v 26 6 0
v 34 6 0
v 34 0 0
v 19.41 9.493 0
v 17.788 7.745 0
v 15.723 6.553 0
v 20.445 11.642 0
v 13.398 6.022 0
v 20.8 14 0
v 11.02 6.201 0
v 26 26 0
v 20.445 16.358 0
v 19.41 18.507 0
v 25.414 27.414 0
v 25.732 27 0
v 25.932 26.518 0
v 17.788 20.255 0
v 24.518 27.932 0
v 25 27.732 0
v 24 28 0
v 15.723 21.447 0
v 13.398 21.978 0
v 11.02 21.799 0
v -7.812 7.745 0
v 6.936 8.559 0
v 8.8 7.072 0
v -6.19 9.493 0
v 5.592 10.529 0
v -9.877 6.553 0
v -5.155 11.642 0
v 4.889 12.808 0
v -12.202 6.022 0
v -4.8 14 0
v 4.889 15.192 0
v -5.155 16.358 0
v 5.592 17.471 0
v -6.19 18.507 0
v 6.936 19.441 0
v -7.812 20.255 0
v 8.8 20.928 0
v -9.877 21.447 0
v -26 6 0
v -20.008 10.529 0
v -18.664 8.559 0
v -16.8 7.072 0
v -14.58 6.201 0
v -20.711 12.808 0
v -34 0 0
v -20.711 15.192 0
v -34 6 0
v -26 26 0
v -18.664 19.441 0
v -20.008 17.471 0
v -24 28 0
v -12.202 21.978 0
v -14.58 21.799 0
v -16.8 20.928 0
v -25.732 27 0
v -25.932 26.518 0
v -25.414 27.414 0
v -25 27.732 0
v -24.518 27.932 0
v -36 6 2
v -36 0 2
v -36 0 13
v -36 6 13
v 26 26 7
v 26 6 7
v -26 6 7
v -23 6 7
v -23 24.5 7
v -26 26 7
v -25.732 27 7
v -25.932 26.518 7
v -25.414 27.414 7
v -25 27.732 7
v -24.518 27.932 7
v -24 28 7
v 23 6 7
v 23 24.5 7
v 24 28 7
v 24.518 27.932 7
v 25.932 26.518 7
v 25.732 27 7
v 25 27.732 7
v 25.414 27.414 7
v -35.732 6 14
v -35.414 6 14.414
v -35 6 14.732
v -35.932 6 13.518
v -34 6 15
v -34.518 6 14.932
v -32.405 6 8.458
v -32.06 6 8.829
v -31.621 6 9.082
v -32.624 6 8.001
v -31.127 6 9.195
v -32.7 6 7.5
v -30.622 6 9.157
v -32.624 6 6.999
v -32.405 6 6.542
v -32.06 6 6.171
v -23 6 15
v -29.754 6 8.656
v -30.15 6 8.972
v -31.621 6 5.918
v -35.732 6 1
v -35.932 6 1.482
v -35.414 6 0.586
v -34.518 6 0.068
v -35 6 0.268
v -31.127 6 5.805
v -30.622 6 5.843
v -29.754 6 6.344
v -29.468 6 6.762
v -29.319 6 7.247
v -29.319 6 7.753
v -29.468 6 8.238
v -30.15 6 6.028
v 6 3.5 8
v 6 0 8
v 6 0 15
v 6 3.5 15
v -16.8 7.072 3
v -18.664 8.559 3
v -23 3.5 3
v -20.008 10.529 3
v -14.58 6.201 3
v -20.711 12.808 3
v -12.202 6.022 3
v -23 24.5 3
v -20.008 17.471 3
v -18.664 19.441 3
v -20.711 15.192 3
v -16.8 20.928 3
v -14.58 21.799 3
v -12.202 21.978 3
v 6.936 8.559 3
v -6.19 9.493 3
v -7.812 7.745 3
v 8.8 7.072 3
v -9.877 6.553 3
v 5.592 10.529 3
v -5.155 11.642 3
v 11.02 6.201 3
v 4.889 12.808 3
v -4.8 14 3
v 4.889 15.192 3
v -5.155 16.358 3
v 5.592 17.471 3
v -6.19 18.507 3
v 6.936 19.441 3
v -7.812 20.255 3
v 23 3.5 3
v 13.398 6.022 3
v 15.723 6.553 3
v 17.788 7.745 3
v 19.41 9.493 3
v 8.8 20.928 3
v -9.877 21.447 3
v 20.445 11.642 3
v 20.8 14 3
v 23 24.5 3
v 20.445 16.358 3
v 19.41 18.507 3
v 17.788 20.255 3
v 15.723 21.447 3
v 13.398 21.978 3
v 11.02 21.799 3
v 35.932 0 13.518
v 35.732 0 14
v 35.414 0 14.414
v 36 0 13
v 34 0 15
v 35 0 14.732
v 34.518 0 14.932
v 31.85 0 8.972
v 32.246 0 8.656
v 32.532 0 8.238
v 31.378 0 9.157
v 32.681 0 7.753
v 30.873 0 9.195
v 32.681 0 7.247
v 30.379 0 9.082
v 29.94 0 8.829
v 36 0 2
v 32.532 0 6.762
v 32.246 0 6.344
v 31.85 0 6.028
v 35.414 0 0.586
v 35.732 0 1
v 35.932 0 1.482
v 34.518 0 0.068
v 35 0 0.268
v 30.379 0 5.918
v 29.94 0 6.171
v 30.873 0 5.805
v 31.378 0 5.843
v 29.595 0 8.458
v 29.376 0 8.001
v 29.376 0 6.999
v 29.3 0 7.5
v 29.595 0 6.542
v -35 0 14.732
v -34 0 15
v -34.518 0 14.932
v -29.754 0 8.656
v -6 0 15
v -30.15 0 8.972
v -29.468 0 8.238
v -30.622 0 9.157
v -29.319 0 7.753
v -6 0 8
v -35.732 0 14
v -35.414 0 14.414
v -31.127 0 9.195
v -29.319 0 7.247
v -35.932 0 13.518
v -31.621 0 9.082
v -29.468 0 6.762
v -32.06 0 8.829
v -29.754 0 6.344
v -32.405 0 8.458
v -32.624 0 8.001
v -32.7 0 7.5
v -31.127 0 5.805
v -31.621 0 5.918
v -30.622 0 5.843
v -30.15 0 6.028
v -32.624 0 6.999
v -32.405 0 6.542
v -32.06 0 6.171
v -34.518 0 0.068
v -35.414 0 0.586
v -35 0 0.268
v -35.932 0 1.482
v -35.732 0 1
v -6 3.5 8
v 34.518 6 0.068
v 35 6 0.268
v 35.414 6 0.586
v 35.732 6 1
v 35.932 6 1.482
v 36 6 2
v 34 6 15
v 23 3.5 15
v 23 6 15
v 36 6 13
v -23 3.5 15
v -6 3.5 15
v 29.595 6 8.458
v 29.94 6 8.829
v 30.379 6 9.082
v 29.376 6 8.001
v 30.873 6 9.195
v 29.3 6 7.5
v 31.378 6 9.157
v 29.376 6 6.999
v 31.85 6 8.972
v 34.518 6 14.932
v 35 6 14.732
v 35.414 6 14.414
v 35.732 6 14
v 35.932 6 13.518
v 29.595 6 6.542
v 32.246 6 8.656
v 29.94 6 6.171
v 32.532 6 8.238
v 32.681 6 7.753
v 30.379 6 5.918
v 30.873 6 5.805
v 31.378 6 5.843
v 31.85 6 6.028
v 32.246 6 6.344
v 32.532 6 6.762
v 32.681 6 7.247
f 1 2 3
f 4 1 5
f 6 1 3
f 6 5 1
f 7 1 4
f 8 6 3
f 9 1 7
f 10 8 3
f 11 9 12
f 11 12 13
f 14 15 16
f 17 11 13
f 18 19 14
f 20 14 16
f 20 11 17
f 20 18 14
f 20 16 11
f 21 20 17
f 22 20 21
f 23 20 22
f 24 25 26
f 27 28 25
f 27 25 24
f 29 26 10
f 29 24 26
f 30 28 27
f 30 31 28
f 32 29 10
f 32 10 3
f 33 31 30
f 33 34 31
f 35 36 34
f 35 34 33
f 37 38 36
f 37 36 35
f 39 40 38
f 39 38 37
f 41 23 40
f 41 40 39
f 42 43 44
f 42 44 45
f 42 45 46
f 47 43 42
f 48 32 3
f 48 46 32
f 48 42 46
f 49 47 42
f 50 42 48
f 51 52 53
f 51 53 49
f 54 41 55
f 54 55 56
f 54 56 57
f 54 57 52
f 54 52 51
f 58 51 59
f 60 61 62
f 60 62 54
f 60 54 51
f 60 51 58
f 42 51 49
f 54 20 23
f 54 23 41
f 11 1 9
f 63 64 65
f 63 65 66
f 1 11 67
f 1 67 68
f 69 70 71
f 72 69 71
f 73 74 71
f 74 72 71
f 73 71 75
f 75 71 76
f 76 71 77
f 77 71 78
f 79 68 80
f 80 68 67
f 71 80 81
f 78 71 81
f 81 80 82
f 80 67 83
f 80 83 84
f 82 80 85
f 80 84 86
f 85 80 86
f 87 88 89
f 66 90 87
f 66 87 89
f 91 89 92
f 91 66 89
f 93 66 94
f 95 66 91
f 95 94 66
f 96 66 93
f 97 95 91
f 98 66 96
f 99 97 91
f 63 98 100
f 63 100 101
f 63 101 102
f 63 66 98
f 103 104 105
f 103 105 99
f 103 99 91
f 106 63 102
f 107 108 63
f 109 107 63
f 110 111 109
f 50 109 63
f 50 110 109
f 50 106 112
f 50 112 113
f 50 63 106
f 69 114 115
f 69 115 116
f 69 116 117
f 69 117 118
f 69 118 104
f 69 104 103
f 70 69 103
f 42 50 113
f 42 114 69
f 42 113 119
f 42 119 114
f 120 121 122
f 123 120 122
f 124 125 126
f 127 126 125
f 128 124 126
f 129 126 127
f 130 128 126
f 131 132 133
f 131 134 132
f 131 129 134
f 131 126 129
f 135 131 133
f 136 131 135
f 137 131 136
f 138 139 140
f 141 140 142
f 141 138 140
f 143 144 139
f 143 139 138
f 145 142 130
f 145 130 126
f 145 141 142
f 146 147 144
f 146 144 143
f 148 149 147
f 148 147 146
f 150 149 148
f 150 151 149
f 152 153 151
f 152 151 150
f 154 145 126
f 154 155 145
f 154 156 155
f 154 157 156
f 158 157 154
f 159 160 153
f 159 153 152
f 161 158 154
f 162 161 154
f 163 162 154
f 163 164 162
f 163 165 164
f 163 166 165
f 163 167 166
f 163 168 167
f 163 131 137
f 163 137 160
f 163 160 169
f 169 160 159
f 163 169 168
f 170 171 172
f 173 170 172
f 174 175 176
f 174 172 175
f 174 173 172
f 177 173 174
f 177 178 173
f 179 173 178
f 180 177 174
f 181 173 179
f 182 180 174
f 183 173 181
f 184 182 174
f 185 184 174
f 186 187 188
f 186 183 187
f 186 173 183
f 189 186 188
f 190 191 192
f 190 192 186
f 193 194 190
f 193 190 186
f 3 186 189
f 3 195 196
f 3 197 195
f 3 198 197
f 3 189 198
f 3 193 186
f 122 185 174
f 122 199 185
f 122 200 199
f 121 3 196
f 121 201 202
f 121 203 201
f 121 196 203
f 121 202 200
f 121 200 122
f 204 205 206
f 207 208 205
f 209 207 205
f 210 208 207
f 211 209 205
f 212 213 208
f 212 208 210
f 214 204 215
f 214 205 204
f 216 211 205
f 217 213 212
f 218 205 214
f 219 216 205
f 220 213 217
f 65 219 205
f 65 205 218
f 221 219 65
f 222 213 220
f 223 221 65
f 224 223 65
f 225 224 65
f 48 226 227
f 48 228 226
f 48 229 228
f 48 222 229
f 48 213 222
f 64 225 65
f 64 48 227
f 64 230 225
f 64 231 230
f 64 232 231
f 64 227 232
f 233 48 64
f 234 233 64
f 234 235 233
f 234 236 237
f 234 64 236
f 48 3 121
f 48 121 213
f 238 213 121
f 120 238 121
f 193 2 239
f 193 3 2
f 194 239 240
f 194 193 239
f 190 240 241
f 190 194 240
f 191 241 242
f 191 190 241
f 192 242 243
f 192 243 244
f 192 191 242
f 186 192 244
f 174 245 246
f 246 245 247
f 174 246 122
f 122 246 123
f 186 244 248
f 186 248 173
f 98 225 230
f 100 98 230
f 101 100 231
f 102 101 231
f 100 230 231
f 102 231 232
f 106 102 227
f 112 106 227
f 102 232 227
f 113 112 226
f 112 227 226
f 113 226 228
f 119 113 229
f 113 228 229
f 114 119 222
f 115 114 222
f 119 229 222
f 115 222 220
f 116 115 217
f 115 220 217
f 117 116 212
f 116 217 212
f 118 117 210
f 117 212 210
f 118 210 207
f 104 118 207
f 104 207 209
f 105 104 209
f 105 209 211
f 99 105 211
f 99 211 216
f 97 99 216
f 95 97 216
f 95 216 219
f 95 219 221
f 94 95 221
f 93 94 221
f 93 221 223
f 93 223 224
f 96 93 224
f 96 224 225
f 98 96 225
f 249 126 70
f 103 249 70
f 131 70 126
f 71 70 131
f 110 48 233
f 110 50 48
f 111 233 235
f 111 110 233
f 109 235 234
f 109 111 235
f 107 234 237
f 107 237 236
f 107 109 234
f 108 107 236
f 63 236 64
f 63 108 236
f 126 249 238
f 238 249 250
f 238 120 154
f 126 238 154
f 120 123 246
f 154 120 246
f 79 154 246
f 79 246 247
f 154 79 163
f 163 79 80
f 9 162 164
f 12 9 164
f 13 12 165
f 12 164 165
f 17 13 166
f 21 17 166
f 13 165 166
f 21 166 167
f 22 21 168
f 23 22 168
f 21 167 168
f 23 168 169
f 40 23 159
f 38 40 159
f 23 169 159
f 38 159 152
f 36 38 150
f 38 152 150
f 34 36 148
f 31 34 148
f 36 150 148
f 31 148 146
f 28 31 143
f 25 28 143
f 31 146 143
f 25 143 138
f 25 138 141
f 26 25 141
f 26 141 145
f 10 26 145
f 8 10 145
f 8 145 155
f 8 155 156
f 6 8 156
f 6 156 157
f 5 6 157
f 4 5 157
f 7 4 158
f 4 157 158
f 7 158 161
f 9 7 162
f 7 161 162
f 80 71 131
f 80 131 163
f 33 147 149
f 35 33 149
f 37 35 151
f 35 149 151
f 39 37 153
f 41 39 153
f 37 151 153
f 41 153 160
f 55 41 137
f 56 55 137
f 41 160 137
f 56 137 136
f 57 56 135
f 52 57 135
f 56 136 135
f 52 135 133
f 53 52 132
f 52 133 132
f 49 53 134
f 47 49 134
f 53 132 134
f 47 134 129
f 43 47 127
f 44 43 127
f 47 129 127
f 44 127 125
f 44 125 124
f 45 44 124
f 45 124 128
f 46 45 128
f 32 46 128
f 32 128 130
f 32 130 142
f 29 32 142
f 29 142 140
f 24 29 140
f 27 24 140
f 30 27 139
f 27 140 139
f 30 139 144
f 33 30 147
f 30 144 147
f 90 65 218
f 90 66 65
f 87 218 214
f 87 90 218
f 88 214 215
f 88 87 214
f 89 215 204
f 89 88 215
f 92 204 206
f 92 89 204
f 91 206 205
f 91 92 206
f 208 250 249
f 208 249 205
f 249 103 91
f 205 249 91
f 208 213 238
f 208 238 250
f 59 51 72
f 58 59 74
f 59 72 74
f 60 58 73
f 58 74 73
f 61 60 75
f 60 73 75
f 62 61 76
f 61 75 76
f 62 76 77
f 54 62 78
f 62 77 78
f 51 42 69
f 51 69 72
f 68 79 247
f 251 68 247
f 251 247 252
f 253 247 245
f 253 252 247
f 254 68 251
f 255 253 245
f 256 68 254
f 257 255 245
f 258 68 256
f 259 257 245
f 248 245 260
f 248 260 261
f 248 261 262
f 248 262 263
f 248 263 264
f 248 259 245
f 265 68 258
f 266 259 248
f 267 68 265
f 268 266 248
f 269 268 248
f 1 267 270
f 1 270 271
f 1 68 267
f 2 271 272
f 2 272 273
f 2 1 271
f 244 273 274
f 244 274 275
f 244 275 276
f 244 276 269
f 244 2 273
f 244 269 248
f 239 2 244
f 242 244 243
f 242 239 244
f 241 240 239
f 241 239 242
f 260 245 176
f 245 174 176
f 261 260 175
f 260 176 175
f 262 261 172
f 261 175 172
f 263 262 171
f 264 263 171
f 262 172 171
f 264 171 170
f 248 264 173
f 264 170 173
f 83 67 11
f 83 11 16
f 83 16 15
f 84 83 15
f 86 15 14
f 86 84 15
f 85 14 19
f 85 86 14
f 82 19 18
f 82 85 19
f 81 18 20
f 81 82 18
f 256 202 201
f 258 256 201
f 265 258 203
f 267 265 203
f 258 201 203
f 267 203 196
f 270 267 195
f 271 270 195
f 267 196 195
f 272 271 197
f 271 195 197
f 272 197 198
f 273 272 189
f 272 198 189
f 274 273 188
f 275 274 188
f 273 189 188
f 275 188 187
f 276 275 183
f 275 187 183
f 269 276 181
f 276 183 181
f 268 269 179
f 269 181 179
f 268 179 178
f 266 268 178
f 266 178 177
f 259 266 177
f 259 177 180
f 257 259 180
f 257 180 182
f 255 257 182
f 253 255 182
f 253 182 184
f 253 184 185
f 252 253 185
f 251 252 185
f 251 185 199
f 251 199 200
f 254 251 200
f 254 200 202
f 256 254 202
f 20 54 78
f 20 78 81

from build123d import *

# Parameters (mm, degrees)
BOSS_EXTRU_1_DEPTH      = 15
ESQUISSE2_W             = 46
ESQUISSE2_H             = 21
ENL_V_MAT_EXTRU_1_DEPTH = 12
ESQUISSE4_R             = 8
ENL_V_MAT_EXTRU_2_DEPTH = 3
ENL_V_MAT_EXTRU_3_REACH = 50.01
ESQUISSE5_W             = 12
ESQUISSE5_H             = 7
CONG_1_R                = 2
D_GAGEMENT_M31_D        = 3.4
ENL_V_MAT_EXTRU_4_REACH = 71.663
ESQUISSE10_W            = 8
ESQUISSE10_H            = 25


with BuildPart() as part:
    # Esquisse1 → Boss.-Extru.1 (new body)
    with BuildSketch(Plane.XY):
        Polygon((36, 0), (-36, 0), (-36, 6), (-26, 6), (-26, 28), (26, 28), (26, 6), (36, 6), align=None)
    extrude(amount=BOSS_EXTRU_1_DEPTH)

    # Esquisse2 → Enlèv. mat.-Extru.1 (cut)
    with BuildSketch(Plane.XY.offset(15)):
        with Locations((0, 14)):
            Rectangle(ESQUISSE2_W, ESQUISSE2_H)
    extrude(amount=-ENL_V_MAT_EXTRU_1_DEPTH, mode=Mode.SUBTRACT)

    # Esquisse4 → Enlèv. mat.-Extru.2 (cut)
    with BuildSketch(Plane.XY.offset(3)):
        with Locations((-12.8, 14)):
            Circle(ESQUISSE4_R)
        with Locations((12.8, 14)):
            Circle(ESQUISSE4_R)
    extrude(amount=-ENL_V_MAT_EXTRU_2_DEPTH, mode=Mode.SUBTRACT)

    # Enlèv. mat.-Extru.3: up to this face of the body (flat: up to its plane)
    enl_v_mat_extru_3_end = Plane(part.part.faces().sort_by_distance((0, 28, 7.5))[0])
    # Esquisse5 → Enlèv. mat.-Extru.3 (cut, up to the picked face)
    with BuildSketch(Plane.XZ, mode=Mode.PRIVATE) as enl_v_mat_extru_3_sk1:
        with Locations((0, 11.5)):
            Rectangle(ESQUISSE5_W, ESQUISSE5_H)
    enl_v_mat_extru_3_tool1 = split(extrude(enl_v_mat_extru_3_sk1.sketch, amount=-ENL_V_MAT_EXTRU_3_REACH, mode=Mode.PRIVATE), bisect_by=enl_v_mat_extru_3_end, keep=Keep.BOTH, mode=Mode.PRIVATE)
    add(enl_v_mat_extru_3_tool1.solids().sort_by(Axis((0, 0, 11.5), (0, 1, 0)))[0], mode=Mode.SUBTRACT)

    # Congé1
    cong_1_edges = [part.edges().sort_by_distance(p)[0] for p in [
        (36, 3, 0),
        (-36, 3, 0),
        (36, 3, 15),
        (-26, 28, 7.5),
        (26, 28, 7.5),
        (-36, 3, 15),
    ]]
    fillet(cong_1_edges, radius=CONG_1_R)

    # Dégagement M31 (through all)
    with Locations(Plane(origin=(0, 6, 0), x_dir=(1, 0, 0), z_dir=(0, 1, 0))):
        with Locations((-31, -7.5), (31, -7.5)):
            Hole(D_GAGEMENT_M31_D / 2)

    # Enlèv. mat.-Extru.4: up to this face of the body (flat: up to its plane)
    enl_v_mat_extru_4_end = Plane(part.part.faces().sort_by_distance((-26, 16, 7.5))[0])
    # Esquisse10 → Enlèv. mat.-Extru.4 (cut, up to the picked face)
    with BuildSketch(Plane(origin=(26, 0, 0), x_dir=(0, 0, -1), z_dir=(1, 0, 0)), mode=Mode.PRIVATE) as enl_v_mat_extru_4_sk1:
        with Locations((-11, 18.5)):
            Rectangle(ESQUISSE10_W, ESQUISSE10_H)
    enl_v_mat_extru_4_tool1 = split(extrude(enl_v_mat_extru_4_sk1.sketch, amount=-ENL_V_MAT_EXTRU_4_REACH, mode=Mode.PRIVATE), bisect_by=enl_v_mat_extru_4_end, keep=Keep.BOTH, mode=Mode.PRIVATE)
    add(enl_v_mat_extru_4_tool1.solids().sort_by(Axis((26, 18.5, 11), (-1, 0, 0)))[0], mode=Mode.SUBTRACT)


solid = part.part
